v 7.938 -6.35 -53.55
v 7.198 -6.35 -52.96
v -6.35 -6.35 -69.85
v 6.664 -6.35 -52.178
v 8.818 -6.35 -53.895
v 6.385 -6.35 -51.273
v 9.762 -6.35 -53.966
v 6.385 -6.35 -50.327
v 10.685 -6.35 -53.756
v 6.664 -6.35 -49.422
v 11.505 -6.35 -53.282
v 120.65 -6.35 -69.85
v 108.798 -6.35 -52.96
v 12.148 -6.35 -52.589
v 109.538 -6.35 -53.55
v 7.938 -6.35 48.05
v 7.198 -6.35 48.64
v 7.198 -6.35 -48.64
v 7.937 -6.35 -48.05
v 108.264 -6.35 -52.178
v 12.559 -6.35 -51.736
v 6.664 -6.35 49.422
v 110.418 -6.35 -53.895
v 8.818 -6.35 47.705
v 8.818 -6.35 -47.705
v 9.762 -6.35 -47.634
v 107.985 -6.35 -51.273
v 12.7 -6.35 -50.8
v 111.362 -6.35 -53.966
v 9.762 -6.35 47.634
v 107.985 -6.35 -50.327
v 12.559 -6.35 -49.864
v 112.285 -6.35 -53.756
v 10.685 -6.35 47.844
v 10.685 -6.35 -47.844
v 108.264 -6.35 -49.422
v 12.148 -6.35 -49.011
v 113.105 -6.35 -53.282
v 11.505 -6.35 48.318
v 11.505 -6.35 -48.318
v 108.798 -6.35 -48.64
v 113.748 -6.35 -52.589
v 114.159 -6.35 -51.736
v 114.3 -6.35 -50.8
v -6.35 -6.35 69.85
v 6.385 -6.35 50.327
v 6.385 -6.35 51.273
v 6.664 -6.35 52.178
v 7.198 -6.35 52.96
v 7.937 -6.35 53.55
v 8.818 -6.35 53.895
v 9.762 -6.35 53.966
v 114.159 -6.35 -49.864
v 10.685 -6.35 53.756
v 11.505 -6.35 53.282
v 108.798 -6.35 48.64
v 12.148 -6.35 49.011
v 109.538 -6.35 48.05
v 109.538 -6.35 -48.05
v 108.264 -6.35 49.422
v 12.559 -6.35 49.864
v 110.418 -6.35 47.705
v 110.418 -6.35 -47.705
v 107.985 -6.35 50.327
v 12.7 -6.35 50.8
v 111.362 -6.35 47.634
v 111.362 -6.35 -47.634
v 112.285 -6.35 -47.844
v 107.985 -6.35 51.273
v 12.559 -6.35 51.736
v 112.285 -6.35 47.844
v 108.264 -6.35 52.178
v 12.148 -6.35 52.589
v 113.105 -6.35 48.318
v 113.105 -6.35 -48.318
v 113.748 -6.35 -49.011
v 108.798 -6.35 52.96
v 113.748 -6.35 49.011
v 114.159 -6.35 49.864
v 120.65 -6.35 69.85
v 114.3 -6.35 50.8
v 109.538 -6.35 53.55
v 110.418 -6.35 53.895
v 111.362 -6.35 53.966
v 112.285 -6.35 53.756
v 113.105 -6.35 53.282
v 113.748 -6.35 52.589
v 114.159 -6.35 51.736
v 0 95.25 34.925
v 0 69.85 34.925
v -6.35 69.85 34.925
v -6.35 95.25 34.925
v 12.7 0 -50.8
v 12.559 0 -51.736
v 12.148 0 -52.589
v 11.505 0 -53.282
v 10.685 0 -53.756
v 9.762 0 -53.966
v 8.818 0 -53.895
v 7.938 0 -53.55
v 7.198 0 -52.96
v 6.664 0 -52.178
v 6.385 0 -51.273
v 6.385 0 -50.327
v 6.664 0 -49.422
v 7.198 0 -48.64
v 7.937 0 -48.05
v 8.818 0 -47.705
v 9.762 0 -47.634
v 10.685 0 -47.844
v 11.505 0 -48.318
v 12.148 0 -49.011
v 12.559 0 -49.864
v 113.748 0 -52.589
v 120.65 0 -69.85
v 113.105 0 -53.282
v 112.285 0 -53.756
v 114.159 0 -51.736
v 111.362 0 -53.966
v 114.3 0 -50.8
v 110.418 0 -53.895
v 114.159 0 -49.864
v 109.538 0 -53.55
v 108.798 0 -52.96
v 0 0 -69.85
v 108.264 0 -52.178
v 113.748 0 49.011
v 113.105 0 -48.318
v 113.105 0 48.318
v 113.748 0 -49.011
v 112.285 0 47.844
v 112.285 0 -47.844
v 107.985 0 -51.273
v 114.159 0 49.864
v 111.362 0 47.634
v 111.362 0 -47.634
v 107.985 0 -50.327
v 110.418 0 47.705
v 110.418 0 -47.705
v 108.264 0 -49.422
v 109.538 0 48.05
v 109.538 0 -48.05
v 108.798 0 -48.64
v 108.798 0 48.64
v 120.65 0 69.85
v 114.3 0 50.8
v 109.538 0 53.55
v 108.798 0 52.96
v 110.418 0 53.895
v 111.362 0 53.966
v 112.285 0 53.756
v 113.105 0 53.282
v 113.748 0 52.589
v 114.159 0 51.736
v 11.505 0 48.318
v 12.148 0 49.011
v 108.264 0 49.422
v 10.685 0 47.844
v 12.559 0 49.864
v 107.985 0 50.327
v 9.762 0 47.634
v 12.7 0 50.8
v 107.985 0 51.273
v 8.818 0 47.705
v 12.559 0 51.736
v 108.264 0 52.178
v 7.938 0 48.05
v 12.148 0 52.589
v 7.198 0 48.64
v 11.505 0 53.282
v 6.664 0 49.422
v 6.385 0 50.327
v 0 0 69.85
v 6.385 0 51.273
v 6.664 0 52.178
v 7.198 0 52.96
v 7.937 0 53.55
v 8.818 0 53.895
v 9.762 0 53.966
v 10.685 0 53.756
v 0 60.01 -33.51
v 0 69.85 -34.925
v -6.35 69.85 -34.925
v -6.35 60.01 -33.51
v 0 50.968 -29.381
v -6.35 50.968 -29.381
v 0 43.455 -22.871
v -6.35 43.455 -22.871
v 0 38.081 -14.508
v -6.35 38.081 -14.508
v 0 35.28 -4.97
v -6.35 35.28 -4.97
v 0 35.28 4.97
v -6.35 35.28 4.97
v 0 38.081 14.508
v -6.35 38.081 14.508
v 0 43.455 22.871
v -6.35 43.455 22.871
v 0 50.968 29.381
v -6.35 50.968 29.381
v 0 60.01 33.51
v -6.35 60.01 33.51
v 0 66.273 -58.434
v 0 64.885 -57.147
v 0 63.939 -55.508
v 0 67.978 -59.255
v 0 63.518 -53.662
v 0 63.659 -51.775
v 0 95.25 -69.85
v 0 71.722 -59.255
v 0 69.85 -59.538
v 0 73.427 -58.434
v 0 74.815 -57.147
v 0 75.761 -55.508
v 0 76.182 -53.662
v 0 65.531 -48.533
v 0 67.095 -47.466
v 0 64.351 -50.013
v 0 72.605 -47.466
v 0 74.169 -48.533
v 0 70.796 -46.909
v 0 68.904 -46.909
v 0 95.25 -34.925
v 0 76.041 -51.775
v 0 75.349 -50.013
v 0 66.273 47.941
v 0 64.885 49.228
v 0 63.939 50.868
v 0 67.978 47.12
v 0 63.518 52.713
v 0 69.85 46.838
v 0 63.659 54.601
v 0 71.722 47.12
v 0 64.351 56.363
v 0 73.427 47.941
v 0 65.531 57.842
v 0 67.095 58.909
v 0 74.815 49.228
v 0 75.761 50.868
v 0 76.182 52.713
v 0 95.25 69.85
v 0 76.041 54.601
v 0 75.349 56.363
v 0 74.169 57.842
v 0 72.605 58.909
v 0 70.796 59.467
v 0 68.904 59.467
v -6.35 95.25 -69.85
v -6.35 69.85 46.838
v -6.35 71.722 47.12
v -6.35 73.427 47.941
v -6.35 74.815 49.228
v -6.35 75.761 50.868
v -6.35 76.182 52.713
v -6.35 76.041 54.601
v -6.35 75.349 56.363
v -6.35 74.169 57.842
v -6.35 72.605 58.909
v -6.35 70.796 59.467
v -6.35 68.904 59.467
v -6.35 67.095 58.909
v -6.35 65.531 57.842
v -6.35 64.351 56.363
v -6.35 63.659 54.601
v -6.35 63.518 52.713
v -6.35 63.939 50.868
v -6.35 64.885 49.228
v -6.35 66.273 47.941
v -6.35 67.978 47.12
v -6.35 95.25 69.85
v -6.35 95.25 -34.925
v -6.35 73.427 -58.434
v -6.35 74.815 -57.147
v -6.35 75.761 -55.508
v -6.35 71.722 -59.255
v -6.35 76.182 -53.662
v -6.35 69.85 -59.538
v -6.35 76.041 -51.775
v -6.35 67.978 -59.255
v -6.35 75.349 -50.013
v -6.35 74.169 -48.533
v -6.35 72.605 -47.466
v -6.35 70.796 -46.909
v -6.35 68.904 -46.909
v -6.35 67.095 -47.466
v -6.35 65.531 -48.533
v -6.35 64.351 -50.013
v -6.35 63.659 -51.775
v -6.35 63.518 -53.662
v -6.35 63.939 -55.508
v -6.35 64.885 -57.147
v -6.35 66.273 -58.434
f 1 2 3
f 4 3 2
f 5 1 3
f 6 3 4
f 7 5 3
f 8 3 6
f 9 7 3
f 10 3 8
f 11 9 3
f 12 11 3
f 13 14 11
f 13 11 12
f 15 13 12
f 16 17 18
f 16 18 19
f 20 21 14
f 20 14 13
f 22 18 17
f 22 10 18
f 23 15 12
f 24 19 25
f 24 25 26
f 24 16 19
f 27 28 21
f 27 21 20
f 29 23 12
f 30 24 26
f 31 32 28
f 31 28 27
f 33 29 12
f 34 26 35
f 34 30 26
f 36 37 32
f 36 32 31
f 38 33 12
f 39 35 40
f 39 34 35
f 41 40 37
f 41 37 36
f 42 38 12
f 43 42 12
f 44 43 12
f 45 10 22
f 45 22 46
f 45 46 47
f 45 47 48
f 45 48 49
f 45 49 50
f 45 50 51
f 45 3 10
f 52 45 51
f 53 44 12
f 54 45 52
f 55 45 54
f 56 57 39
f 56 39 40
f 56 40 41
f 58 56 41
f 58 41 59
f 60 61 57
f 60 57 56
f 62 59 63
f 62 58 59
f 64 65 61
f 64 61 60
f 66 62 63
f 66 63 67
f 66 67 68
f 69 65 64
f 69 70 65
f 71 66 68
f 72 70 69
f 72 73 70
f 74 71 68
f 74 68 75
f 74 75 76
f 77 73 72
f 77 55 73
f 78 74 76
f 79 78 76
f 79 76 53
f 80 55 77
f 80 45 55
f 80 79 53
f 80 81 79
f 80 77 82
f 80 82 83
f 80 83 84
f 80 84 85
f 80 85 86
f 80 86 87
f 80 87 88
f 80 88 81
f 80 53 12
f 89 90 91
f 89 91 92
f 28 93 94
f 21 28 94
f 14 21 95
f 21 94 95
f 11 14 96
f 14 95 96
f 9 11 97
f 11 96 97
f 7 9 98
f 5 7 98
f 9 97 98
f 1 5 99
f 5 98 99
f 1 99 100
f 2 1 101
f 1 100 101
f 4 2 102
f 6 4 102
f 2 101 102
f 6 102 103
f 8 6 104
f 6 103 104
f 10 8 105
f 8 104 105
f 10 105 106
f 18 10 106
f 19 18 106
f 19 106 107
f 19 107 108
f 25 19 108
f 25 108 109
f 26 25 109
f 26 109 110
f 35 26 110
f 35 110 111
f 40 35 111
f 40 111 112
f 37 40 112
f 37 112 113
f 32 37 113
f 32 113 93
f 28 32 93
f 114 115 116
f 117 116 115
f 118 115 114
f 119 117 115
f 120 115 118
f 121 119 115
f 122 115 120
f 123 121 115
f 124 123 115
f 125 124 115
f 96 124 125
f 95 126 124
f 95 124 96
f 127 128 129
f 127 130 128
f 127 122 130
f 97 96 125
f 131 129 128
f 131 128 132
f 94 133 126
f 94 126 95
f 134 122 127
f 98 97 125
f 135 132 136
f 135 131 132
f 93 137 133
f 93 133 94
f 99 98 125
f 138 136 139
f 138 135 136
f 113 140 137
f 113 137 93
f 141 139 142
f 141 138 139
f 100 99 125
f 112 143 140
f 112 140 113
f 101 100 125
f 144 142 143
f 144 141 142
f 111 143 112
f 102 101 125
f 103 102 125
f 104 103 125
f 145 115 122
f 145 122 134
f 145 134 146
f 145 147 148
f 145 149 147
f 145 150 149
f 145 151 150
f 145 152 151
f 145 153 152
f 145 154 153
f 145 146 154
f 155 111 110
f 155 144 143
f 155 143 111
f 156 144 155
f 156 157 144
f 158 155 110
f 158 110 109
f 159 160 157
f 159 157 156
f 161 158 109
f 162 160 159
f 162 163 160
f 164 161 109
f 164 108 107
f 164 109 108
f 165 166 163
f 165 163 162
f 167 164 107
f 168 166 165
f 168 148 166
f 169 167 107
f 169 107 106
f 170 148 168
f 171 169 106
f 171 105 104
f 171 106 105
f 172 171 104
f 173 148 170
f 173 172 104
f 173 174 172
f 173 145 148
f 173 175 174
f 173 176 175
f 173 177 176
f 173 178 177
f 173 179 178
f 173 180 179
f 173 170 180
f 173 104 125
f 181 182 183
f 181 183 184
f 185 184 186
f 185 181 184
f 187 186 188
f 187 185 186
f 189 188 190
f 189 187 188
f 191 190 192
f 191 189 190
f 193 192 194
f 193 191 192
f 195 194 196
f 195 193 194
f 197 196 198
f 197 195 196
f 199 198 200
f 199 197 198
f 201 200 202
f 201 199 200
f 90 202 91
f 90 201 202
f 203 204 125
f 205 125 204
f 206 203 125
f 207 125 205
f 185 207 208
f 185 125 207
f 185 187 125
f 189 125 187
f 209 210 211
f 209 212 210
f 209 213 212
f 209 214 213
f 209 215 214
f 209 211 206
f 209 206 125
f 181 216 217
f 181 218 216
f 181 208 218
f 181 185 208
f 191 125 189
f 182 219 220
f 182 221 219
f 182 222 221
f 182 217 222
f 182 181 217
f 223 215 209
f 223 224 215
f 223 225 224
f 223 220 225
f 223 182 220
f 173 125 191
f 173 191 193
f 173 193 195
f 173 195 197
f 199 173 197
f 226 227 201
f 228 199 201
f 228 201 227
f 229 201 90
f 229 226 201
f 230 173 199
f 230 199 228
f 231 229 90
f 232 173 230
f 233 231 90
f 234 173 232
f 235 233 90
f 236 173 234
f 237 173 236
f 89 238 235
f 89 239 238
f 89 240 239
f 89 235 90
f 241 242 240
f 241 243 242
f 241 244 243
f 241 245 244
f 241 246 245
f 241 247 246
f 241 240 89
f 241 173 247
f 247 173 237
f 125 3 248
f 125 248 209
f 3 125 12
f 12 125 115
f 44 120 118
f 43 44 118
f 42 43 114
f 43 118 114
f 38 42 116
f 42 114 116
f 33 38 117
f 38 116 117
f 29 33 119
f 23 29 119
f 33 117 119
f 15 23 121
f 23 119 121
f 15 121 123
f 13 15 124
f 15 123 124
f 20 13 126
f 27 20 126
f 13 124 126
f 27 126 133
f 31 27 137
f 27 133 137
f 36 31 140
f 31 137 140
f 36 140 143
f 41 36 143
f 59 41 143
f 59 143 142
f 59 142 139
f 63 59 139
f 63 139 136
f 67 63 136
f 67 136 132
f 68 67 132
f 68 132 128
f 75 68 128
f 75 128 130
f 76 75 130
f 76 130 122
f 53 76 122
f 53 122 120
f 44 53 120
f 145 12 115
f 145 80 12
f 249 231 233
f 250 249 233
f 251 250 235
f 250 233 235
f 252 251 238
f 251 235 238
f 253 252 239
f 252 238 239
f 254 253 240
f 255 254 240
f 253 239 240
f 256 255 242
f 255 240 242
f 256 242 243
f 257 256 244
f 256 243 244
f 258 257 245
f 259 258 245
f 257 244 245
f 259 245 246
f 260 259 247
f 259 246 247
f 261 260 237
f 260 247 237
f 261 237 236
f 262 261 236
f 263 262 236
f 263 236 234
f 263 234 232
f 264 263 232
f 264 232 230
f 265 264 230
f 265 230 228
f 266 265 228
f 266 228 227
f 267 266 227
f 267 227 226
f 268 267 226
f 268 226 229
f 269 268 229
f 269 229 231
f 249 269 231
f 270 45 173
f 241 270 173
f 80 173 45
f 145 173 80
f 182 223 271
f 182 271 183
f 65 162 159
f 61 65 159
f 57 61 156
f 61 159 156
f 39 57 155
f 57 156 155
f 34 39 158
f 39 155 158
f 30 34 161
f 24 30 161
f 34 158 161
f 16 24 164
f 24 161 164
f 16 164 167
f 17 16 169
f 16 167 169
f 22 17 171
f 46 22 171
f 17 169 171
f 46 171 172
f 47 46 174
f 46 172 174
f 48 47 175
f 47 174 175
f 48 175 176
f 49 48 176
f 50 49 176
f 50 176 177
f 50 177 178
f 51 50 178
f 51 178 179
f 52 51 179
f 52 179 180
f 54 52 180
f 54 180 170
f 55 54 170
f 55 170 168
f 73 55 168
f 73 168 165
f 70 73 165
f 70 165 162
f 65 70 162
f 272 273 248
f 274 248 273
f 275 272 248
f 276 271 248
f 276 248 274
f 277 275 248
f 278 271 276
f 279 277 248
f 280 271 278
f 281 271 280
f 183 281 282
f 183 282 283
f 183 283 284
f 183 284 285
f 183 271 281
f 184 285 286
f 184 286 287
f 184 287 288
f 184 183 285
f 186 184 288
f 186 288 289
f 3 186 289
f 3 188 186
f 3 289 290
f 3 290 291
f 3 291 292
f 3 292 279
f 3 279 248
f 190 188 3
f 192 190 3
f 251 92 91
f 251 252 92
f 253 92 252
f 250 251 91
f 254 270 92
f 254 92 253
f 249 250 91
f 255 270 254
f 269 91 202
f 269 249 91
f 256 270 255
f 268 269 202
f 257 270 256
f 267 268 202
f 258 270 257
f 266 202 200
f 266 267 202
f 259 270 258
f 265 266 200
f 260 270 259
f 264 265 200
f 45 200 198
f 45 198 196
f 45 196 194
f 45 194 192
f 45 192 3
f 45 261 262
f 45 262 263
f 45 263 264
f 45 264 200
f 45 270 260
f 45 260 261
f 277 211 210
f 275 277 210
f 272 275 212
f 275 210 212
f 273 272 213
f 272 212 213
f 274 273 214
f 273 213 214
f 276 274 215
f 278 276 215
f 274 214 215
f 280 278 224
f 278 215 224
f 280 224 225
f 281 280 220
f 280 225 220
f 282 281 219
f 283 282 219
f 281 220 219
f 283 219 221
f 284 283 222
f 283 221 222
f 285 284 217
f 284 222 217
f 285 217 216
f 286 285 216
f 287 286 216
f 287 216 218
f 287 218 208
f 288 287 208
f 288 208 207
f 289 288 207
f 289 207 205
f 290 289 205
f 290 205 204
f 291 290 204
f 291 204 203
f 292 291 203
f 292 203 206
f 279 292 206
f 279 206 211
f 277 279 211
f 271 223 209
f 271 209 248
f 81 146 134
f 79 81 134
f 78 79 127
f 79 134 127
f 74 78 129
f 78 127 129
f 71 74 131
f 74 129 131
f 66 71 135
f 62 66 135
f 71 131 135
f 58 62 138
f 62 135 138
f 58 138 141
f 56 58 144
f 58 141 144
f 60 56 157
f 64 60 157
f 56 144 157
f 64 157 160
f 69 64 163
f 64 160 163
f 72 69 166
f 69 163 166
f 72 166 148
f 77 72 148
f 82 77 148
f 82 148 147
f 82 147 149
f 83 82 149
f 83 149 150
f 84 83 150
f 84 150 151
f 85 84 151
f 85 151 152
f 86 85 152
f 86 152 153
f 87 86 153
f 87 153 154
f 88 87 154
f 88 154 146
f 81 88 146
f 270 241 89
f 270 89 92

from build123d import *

# Parameters (mm, degrees)
BOSS_EXTRUDE1_DEPTH = 69.85
CUT_EXTRUDE1_REACH  = 8.35
SKETCH2_R           = 6.35
CUT_EXTRUDE2_REACH  = 8.35
SKETCH3_R           = 3.175


with BuildPart() as part:
    # Sketch1 → Boss-Extrude1 (new body, symmetric)
    with BuildSketch(Plane.XY):
        Polygon((0, 0), (0, 95.25), (-6.35, 95.25), (-6.35, -6.35), (120.65, -6.35), (120.65, 0), align=None)
    extrude(amount=BOSS_EXTRUDE1_DEPTH, both=True)

    # Sketch2 → Cut-Extrude1 (cut, up to next)
    with BuildSketch(Plane(origin=(0, 0, 0), x_dir=(0, 0, -1), z_dir=(1, 0, 0)), mode=Mode.PRIVATE) as cut_extrude1_sk1:
        with Locations((-53.1876, 69.85)):
            Circle(SKETCH2_R)
    cut_extrude1_tool1 = extrude(cut_extrude1_sk1.sketch, amount=-CUT_EXTRUDE1_REACH, mode=Mode.PRIVATE) & part.part
    add(cut_extrude1_tool1.solids().sort_by_distance((0, 69.85, 53.1876))[0], mode=Mode.SUBTRACT)
    # Sketch2 → Cut-Extrude1 (cut, up to next)
    with BuildSketch(Plane(origin=(0, 0, 0), x_dir=(0, 0, -1), z_dir=(1, 0, 0)), mode=Mode.PRIVATE) as cut_extrude1_sk2:
        with Locations((53.1876, 69.85)):
            Circle(SKETCH2_R)
    cut_extrude1_tool2 = extrude(cut_extrude1_sk2.sketch, amount=-CUT_EXTRUDE1_REACH, mode=Mode.PRIVATE) & part.part
    add(cut_extrude1_tool2.solids().sort_by_distance((0, 69.85, -53.1876))[0], mode=Mode.SUBTRACT)
    # Sketch2 → Cut-Extrude1 (cut, up to next)
    with BuildSketch(Plane(origin=(0, 0, 0), x_dir=(0, 0, -1), z_dir=(1, 0, 0)), mode=Mode.PRIVATE) as cut_extrude1_sk3:
        with BuildLine():
            Line((-34.925, 69.85), (-34.925, 95.25))
            Line((-34.925, 95.25), (34.925, 95.25))
            Line((34.925, 95.25), (34.925, 69.85))
            ThreePointArc((34.925, 69.85), (0, 34.925), (-34.925, 69.85))
        make_face()
    cut_extrude1_tool3 = extrude(cut_extrude1_sk3.sketch, amount=-CUT_EXTRUDE1_REACH, mode=Mode.PRIVATE) & part.part
    add(cut_extrude1_tool3.solids().sort_by_distance((0, 68.259897, 0))[0], mode=Mode.SUBTRACT)

    # Sketch3 → Cut-Extrude2 (cut, up to next)
    with BuildSketch(Plane(origin=(0, 0, 0), x_dir=(1, 0, 0), z_dir=(0, 1, 0)), mode=Mode.PRIVATE) as cut_extrude2_sk1:
        with Locations((9.525, 50.8)):
            Circle(SKETCH3_R)
    cut_extrude2_tool1 = extrude(cut_extrude2_sk1.sketch, amount=-CUT_EXTRUDE2_REACH, mode=Mode.PRIVATE) & part.part
    add(cut_extrude2_tool1.solids().sort_by_distance((9.525, 0, -50.8))[0], mode=Mode.SUBTRACT)
    # Sketch3 → Cut-Extrude2 (cut, up to next)
    with BuildSketch(Plane(origin=(0, 0, 0), x_dir=(1, 0, 0), z_dir=(0, 1, 0)), mode=Mode.PRIVATE) as cut_extrude2_sk2:
        with Locations((111.125, 50.8)):
            Circle(SKETCH3_R)
    cut_extrude2_tool2 = extrude(cut_extrude2_sk2.sketch, amount=-CUT_EXTRUDE2_REACH, mode=Mode.PRIVATE) & part.part
    add(cut_extrude2_tool2.solids().sort_by_distance((111.125, 0, -50.8))[0], mode=Mode.SUBTRACT)
    # Sketch3 → Cut-Extrude2 (cut, up to next)
    with BuildSketch(Plane(origin=(0, 0, 0), x_dir=(1, 0, 0), z_dir=(0, 1, 0)), mode=Mode.PRIVATE) as cut_extrude2_sk3:
        with Locations((9.525, -50.8)):
            Circle(SKETCH3_R)
    cut_extrude2_tool3 = extrude(cut_extrude2_sk3.sketch, amount=-CUT_EXTRUDE2_REACH, mode=Mode.PRIVATE) & part.part
    add(cut_extrude2_tool3.solids().sort_by_distance((9.525, 0, 50.8))[0], mode=Mode.SUBTRACT)
    # Sketch3 → Cut-Extrude2 (cut, up to next)
    with BuildSketch(Plane(origin=(0, 0, 0), x_dir=(1, 0, 0), z_dir=(0, 1, 0)), mode=Mode.PRIVATE) as cut_extrude2_sk4:
        with Locations((111.125, -50.8)):
            Circle(SKETCH3_R)
    cut_extrude2_tool4 = extrude(cut_extrude2_sk4.sketch, amount=-CUT_EXTRUDE2_REACH, mode=Mode.PRIVATE) & part.part
    add(cut_extrude2_tool4.solids().sort_by_distance((111.125, 0, 50.8))[0], mode=Mode.SUBTRACT)


solid = part.part
